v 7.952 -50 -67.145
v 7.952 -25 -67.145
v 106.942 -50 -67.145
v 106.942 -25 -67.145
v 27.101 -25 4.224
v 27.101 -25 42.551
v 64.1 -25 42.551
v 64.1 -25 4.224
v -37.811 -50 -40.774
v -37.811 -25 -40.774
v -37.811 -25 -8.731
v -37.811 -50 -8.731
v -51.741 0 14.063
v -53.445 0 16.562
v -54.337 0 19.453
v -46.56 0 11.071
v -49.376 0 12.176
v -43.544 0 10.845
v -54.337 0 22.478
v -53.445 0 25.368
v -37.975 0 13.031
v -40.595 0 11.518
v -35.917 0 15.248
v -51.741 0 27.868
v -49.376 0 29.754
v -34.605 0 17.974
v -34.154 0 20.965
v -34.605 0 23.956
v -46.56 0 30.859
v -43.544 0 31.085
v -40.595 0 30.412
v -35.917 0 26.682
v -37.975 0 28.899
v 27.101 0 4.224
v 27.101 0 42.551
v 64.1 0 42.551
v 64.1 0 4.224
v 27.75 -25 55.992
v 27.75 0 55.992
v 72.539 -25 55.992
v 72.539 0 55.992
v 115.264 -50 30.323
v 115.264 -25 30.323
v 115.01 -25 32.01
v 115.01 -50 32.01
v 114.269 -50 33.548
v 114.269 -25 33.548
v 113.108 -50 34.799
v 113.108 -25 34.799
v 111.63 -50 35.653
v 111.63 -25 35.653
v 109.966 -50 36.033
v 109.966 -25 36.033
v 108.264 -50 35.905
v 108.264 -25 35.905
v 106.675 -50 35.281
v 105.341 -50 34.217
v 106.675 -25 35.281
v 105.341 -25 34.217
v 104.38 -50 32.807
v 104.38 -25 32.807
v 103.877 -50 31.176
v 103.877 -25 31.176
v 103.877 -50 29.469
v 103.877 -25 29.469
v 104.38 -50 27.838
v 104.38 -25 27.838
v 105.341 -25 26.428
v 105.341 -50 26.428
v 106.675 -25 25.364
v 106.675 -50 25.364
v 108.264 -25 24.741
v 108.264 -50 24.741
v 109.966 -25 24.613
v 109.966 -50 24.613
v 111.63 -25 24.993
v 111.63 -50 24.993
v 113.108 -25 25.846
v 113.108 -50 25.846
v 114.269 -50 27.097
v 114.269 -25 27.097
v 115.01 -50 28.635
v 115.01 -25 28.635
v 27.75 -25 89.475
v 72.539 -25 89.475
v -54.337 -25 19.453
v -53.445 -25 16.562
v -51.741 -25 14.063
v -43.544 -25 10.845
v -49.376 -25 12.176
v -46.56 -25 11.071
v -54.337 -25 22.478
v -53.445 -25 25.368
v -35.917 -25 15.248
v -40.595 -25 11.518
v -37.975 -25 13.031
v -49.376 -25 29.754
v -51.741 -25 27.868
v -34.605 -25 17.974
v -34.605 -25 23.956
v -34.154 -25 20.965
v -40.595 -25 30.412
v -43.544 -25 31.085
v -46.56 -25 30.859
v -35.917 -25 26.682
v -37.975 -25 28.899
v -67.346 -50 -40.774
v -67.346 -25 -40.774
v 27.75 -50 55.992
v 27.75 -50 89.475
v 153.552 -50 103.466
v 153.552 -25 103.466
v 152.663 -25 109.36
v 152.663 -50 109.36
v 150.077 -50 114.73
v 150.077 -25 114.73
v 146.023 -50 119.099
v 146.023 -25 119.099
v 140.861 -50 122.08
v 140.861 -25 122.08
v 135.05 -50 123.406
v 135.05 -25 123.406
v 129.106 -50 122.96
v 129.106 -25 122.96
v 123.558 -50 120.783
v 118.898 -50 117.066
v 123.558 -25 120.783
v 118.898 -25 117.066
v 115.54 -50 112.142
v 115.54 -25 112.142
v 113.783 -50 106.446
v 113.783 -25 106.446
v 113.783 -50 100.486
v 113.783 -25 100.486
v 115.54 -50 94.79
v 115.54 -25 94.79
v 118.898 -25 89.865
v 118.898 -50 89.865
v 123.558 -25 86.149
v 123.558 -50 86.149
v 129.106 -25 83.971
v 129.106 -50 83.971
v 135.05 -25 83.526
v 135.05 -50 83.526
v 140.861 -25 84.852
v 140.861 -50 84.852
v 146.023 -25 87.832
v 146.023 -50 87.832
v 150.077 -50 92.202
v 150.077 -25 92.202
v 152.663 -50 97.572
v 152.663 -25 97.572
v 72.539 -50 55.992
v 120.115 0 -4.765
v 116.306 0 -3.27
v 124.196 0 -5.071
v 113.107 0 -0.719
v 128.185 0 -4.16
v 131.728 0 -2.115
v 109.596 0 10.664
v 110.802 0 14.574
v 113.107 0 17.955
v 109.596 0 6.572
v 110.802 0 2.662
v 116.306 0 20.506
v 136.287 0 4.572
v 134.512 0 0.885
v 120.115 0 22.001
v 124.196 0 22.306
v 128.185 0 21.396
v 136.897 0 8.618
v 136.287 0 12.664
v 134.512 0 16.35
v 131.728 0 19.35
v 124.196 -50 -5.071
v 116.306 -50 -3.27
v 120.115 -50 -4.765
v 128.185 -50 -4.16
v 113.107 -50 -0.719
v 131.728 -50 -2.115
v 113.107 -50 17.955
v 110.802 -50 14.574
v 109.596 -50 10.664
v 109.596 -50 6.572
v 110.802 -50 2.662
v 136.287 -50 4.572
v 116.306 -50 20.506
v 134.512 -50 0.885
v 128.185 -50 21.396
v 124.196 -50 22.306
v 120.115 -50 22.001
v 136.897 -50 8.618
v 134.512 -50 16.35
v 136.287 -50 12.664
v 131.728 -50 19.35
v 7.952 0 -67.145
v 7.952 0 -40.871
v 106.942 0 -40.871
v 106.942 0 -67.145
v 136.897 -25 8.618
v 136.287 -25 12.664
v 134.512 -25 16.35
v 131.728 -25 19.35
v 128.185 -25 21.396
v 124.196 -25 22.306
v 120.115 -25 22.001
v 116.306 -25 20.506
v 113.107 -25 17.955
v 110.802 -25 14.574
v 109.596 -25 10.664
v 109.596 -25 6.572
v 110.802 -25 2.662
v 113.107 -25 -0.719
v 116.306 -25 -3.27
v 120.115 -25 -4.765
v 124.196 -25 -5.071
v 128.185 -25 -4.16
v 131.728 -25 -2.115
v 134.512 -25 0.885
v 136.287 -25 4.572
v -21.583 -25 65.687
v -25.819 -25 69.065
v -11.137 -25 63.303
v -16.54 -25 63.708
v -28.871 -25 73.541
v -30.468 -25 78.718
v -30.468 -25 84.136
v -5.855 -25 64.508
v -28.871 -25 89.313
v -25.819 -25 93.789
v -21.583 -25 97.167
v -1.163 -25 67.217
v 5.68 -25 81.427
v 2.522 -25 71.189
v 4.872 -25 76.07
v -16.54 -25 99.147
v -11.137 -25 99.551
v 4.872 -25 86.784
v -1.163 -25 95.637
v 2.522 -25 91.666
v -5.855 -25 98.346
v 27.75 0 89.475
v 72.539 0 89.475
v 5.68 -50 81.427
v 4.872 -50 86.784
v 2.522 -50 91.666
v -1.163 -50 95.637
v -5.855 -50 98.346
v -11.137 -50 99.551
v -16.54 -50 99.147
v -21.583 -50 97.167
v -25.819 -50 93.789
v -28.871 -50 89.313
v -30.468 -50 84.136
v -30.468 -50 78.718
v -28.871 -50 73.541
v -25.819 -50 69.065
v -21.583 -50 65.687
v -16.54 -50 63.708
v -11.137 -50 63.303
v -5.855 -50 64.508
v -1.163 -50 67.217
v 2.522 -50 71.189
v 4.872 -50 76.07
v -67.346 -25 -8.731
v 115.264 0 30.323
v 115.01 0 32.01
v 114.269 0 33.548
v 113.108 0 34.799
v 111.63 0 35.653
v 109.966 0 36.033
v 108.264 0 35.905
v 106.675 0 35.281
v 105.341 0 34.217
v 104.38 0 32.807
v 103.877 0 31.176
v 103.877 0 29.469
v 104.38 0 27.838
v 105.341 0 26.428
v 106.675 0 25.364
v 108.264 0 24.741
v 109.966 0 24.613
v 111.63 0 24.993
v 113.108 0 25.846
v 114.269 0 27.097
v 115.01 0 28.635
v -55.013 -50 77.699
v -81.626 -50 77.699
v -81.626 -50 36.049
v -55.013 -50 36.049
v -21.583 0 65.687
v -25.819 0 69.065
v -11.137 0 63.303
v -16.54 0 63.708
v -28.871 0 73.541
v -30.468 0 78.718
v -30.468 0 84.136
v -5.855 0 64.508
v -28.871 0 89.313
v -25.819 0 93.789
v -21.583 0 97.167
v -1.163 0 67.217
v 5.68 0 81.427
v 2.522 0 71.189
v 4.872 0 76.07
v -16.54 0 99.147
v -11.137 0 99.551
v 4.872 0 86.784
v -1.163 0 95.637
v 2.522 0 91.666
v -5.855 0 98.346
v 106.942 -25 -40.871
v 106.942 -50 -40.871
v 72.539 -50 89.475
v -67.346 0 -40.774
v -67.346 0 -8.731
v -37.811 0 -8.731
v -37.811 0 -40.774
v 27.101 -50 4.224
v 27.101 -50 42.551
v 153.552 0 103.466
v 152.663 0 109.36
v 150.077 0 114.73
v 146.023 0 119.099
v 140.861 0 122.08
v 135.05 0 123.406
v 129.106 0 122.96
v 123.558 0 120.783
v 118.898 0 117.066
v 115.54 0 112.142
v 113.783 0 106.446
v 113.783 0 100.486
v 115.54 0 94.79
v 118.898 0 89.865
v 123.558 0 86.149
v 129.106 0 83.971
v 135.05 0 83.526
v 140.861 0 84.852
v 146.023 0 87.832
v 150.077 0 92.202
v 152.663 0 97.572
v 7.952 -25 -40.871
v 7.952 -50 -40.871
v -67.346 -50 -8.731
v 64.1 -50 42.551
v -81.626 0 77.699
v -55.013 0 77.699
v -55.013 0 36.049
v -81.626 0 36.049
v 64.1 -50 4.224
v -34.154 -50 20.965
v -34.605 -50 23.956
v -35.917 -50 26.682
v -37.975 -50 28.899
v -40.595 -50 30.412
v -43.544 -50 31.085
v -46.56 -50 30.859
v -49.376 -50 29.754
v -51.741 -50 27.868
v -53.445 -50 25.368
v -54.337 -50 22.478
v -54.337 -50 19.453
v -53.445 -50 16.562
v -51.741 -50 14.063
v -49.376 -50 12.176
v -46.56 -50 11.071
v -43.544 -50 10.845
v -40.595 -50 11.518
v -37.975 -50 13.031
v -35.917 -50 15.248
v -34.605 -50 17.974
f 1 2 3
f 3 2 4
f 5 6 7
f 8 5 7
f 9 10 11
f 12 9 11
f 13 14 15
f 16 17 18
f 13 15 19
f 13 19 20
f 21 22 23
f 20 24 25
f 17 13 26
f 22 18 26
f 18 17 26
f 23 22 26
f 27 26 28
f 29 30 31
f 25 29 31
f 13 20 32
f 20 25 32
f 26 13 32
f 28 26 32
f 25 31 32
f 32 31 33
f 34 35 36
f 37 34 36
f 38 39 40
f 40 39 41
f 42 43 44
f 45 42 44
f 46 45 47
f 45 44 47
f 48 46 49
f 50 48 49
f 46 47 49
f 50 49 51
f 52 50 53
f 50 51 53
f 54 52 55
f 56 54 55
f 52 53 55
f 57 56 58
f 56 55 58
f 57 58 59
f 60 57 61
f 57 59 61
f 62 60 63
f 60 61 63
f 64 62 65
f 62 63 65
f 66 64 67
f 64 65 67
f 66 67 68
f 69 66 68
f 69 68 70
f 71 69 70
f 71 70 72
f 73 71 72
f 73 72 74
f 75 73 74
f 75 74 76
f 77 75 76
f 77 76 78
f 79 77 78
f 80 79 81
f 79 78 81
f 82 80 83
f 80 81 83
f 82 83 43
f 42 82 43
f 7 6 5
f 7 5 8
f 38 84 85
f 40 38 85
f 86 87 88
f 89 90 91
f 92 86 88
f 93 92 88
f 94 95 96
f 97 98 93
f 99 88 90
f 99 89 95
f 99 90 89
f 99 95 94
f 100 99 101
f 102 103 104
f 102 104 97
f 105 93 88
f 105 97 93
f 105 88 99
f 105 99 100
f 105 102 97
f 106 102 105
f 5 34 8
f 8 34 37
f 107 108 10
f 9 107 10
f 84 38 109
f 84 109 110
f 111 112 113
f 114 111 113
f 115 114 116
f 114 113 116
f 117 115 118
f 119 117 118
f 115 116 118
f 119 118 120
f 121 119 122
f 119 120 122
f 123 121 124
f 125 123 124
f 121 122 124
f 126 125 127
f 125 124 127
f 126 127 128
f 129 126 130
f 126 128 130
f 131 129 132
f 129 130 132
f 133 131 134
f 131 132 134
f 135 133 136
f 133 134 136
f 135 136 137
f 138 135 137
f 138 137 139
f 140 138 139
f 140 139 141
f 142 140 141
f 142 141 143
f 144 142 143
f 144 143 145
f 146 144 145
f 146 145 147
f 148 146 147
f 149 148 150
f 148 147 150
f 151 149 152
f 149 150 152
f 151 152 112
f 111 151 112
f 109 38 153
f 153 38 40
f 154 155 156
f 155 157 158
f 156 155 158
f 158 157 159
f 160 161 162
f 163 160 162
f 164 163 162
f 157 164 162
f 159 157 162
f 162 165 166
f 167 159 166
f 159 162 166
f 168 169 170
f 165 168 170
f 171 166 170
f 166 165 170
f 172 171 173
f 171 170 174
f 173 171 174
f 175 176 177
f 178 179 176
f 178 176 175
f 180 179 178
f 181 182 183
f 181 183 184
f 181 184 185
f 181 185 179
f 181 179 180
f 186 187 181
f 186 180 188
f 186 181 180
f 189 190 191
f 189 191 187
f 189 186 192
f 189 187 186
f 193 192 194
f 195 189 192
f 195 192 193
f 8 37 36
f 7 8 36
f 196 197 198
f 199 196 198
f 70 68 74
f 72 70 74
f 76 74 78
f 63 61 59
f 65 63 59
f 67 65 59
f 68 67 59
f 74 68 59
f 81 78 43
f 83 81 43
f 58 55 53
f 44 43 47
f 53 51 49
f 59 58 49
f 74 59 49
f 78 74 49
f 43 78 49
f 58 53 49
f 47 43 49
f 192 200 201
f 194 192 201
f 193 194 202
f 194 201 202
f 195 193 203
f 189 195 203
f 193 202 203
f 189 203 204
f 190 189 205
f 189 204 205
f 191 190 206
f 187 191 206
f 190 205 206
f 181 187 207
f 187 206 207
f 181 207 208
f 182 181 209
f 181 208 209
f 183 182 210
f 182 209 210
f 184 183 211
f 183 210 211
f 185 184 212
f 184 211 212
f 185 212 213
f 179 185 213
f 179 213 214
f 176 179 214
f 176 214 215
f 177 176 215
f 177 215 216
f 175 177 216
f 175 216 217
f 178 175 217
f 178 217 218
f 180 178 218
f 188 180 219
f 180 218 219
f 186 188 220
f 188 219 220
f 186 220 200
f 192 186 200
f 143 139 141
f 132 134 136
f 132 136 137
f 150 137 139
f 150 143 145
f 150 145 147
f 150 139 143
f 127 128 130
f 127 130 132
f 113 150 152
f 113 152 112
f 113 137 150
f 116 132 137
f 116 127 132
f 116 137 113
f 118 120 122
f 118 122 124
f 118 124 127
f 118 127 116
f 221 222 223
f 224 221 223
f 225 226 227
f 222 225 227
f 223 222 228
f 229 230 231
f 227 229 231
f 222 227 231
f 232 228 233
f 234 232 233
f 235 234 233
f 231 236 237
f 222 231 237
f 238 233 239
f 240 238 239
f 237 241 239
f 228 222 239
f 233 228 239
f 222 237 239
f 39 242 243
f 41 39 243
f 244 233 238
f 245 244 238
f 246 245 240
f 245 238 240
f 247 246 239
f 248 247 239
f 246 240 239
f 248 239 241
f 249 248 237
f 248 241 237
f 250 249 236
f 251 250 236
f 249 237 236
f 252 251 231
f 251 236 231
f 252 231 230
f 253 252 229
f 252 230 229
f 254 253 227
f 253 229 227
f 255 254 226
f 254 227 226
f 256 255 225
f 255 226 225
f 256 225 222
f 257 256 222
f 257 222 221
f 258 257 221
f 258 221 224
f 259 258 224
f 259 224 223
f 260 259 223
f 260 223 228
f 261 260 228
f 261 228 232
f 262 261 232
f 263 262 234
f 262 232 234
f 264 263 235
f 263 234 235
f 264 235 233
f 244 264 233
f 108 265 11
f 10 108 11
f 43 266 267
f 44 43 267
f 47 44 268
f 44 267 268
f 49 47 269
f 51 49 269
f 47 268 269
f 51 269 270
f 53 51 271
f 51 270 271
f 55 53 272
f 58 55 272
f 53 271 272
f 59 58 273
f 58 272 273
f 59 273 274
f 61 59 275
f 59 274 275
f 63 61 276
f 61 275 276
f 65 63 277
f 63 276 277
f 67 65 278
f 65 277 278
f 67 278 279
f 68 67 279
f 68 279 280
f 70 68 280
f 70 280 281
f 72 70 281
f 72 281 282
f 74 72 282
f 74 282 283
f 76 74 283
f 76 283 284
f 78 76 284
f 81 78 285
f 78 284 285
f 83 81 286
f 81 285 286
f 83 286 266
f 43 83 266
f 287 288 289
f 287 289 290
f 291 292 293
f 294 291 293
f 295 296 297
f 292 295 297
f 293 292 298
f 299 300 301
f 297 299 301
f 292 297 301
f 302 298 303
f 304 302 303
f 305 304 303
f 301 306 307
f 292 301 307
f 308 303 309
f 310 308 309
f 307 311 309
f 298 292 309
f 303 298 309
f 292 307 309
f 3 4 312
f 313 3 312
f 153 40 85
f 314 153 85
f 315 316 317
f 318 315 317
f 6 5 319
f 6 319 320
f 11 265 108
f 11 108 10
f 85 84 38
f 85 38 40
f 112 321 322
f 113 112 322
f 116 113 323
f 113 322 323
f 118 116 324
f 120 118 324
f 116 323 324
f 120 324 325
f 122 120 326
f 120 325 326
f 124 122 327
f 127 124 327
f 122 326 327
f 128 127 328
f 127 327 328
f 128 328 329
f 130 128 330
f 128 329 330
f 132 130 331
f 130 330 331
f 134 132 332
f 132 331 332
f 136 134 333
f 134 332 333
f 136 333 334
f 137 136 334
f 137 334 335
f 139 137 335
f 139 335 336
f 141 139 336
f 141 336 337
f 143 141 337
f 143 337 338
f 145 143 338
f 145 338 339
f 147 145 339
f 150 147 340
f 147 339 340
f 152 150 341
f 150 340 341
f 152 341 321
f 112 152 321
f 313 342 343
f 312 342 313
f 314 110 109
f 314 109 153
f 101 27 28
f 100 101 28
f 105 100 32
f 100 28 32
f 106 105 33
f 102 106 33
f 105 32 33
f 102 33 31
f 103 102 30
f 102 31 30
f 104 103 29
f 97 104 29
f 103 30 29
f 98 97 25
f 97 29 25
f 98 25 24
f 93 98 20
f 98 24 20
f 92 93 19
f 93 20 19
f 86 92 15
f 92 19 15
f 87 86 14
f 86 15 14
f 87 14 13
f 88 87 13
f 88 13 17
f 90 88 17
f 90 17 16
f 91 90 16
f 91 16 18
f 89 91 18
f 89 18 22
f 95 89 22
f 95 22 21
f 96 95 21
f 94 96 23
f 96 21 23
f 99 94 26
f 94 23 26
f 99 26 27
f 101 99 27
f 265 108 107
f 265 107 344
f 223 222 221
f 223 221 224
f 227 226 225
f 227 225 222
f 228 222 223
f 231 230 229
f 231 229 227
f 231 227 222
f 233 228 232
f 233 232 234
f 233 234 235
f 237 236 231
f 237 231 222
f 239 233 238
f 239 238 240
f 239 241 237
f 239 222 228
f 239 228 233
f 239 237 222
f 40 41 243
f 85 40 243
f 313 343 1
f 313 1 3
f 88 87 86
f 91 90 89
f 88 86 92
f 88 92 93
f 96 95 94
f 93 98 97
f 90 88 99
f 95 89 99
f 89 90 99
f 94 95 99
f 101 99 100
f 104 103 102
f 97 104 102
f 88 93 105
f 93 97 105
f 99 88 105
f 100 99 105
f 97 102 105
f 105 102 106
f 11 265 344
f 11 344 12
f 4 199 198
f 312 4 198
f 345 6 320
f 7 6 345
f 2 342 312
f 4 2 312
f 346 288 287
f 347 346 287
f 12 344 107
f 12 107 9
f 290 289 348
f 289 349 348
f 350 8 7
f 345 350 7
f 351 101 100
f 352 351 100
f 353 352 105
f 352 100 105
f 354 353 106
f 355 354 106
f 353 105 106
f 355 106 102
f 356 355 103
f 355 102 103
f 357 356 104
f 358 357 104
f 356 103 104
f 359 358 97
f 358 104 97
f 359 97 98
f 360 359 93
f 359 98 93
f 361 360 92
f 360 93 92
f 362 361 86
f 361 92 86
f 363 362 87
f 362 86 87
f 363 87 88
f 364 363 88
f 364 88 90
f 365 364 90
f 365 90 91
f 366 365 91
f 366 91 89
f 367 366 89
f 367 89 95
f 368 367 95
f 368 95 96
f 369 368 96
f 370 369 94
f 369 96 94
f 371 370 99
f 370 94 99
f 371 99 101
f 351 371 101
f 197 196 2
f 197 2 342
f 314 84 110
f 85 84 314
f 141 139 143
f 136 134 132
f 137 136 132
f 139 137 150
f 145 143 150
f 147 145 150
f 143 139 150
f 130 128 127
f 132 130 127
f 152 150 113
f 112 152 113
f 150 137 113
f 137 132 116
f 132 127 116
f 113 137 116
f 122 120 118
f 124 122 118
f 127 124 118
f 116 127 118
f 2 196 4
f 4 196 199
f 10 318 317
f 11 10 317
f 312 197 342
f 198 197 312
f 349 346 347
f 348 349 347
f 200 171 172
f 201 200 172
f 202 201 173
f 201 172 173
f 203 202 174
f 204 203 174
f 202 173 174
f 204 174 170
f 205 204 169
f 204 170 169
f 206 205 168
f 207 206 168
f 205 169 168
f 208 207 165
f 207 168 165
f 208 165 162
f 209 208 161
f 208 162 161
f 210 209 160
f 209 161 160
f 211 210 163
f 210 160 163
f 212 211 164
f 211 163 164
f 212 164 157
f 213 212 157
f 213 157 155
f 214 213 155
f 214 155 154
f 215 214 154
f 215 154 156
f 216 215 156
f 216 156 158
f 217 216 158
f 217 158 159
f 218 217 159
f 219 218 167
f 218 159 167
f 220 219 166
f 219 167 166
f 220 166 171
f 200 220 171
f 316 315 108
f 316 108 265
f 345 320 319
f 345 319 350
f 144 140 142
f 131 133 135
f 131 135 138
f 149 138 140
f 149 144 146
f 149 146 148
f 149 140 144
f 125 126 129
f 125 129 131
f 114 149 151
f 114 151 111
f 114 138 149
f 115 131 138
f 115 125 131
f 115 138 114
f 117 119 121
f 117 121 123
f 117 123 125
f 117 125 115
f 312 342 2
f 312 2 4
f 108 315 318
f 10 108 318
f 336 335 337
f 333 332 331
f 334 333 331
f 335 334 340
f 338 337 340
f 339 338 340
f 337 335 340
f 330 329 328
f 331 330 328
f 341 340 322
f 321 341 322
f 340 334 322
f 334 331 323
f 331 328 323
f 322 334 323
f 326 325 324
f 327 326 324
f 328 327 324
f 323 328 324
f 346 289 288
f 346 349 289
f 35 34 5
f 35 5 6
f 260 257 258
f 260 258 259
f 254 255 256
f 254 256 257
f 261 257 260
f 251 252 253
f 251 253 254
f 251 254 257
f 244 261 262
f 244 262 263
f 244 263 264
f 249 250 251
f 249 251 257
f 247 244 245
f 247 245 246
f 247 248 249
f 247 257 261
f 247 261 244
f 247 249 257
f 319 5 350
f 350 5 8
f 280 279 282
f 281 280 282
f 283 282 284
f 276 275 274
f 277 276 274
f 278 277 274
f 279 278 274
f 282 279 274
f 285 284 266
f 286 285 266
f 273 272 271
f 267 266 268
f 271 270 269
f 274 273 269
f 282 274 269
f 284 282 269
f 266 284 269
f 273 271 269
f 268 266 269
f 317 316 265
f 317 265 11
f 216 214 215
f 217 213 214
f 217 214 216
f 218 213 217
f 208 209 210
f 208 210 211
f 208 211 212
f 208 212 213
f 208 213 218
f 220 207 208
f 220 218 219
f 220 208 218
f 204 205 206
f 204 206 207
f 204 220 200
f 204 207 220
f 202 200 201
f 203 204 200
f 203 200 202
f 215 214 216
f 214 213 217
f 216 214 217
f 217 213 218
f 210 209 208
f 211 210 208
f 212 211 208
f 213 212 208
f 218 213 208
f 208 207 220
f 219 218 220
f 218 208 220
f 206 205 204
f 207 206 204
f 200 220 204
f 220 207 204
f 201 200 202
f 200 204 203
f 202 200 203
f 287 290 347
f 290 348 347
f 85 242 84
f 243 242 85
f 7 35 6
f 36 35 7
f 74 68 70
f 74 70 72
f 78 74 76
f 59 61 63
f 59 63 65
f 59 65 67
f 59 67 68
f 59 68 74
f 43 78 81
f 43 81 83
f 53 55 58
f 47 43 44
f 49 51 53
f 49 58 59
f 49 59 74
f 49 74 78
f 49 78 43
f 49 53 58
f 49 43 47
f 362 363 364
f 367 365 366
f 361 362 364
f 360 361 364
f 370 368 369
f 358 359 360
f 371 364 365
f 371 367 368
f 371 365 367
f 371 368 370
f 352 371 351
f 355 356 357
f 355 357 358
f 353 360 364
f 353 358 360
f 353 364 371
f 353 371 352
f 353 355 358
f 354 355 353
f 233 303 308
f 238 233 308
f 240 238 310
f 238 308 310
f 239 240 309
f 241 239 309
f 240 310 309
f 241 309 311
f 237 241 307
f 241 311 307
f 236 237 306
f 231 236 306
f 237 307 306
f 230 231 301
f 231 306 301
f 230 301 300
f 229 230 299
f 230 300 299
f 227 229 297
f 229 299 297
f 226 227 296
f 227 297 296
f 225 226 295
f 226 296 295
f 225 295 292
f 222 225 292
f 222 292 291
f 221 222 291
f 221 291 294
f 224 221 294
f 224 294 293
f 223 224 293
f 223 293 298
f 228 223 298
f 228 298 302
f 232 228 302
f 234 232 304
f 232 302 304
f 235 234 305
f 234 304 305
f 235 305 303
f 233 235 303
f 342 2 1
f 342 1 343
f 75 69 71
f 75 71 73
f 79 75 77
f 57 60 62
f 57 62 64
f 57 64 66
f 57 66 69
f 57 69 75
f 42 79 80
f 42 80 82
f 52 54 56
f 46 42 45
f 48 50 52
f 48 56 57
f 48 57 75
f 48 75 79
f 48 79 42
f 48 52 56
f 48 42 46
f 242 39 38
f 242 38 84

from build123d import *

# Parameters (mm, degrees)
F0_W     = 26.613753289
F0_H     = 41.6500791907
F1_DEPTH = 25
F0_W_2   = 44.7890106589
F0_H_2   = 33.482324332
F0_W_3   = 36.9996093214
F0_H_3   = 38.3273893967
F0_W_4   = 29.534779489
F0_H_4   = 32.0437960327
F0_W_5   = 98.9901963621
F0_H_5   = 26.2742973864
F0_R     = 18.1752443314
F0_R_2   = 10.148267962
F0_R_3   = 5.7257656008
F0_R_4   = 13.7270743948
F0_R_5   = 19.9959609748
F2_DEPTH = 25


with BuildPart() as f1:
    # F0 (on Front) → F1 (new body)
    with BuildSketch(Plane.XZ):
        with Locations((-68.3194566518, 56.8735636771)):
            Rectangle(F0_W, F0_H)
    extrude(amount=F1_DEPTH)

    # F2 (add): a face of the model
    f2_faces = [f1.faces().sort_by_distance(p)[0] for p in [
        (-68.3194566518, -25, 56.8735636771),
    ]]
    extrude(f2_faces, amount=F2_DEPTH)


with BuildPart() as f1b:
    # F0 (on Front) → F1, piece 2 (new body)
    with BuildSketch(Plane.XZ):
        with Locations((50.1442132518, 72.7335456759)):
            Rectangle(F0_W_2, F0_H_2)
    extrude(amount=F1_DEPTH)


with BuildPart() as f1c:
    # F0 (on Front) → F1, piece 3 (new body)
    with BuildSketch(Plane.XZ):
        with Locations((45.600393787, 23.3872788958)):
            Rectangle(F0_W_3, F0_H_3)
    extrude(amount=F1_DEPTH)


with BuildPart() as f1d:
    # F0 (on Front) → F1, piece 4 (new body)
    with BuildSketch(Plane.XZ):
        with Locations((-52.5783933699, -24.7525367886)):
            Rectangle(F0_W_4, F0_H_4)
    extrude(amount=F1_DEPTH)


with BuildPart() as f1e:
    # F0 (on Front) → F1, piece 5 (new body)
    with BuildSketch(Plane.XZ):
        with Locations((57.4467657134, -54.0079157799)):
            Rectangle(F0_W_5, F0_H_5)
    extrude(amount=F1_DEPTH)


with BuildPart() as f1f:
    # F0 (on Front) → F1, piece 6 (new body)
    with BuildSketch(Plane.XZ):
        with Locations((-12.4954786152, 81.4270600677)):
            Circle(F0_R)
    extrude(amount=F1_DEPTH)


with BuildPart() as f1g:
    # F0 (on Front) → F1, piece 7 (new body)
    with BuildSketch(Plane.XZ):
        with Locations((-44.3021655083, 20.9651011974)):
            Circle(F0_R_2)
    extrude(amount=F1_DEPTH)


with BuildPart() as f1h:
    # F0 (on Front) → F1, piece 8 (new body)
    with BuildSketch(Plane.XZ):
        with Locations((109.5383316278, 30.3227584809)):
            Circle(F0_R_3)
    extrude(amount=F1_DEPTH)


with BuildPart() as f1i:
    # F0 (on Front) → F1, piece 9 (new body)
    with BuildSketch(Plane.XZ):
        with Locations((123.1697648764, 8.6177336052)):
            Circle(F0_R_4)
    extrude(amount=F1_DEPTH)


with BuildPart() as f1j:
    # F0 (on Front) → F1, piece 10 (new body)
    with BuildSketch(Plane.XZ):
        with Locations((133.5556060076, 103.4657880664)):
            Circle(F0_R_5)
    extrude(amount=F1_DEPTH)


with BuildPart() as f2:
    # F2#2 (new): a face of the model
    f2_2_faces = [f1b.part.faces().sort_by_distance(p)[0] for p in [
        (50.1442132518, -25, 72.7335456759),
    ]]
    extrude(f2_2_faces, amount=F2_DEPTH)


with BuildPart() as f2b:
    # F2#3 (new): a face of the model
    f2_3_faces = [f1f.part.faces().sort_by_distance(p)[0] for p in [
        (-12.4954786152, -25, 81.4270600677),
    ]]
    extrude(f2_3_faces, amount=F2_DEPTH)


with BuildPart() as f2c:
    # F2#4 (new): a face of the model
    f2_4_faces = [f1g.part.faces().sort_by_distance(p)[0] for p in [
        (-44.3021655083, -25, 20.9651011974),
    ]]
    extrude(f2_4_faces, amount=F2_DEPTH)


with BuildPart() as f2d:
    # F2#5 (new): a face of the model
    f2_5_faces = [f1d.part.faces().sort_by_distance(p)[0] for p in [
        (-52.5783933699, -25, -24.7525367886),
    ]]
    extrude(f2_5_faces, amount=F2_DEPTH)


with BuildPart() as f2e:
    # F2#6 (new): a face of the model
    f2_6_faces = [f1e.part.faces().sort_by_distance(p)[0] for p in [
        (57.4467657134, -25, -54.0079157799),
    ]]
    extrude(f2_6_faces, amount=F2_DEPTH)


with BuildPart() as f2f:
    # F2#7 (new): a face of the model
    f2_7_faces = [f1i.part.faces().sort_by_distance(p)[0] for p in [
        (123.1697648764, -25, 8.6177336052),
    ]]
    extrude(f2_7_faces, amount=F2_DEPTH)


with BuildPart() as f2g:
    # F2#8 (new): a face of the model
    f2_8_faces = [f1c.part.faces().sort_by_distance(p)[0] for p in [
        (45.600393787, -25, 23.3872788958),
    ]]
    extrude(f2_8_faces, amount=F2_DEPTH)


with BuildPart() as f2h:
    # F2#9 (new): a face of the model
    f2_9_faces = [f1h.part.faces().sort_by_distance(p)[0] for p in [
        (109.5383316278, -25, 30.3227584809),
    ]]
    extrude(f2_9_faces, amount=F2_DEPTH)


with BuildPart() as f2i:
    # F2#10 (new): a face of the model
    f2_10_faces = [f1j.part.faces().sort_by_distance(p)[0] for p in [
        (133.5556060076, -25, 103.4657880664),
    ]]
    extrude(f2_10_faces, amount=F2_DEPTH)


solid = Compound([f1.part, f1b.part, f1c.part, f1d.part, f1e.part, f1f.part, f1g.part, f1h.part, f1i.part, f1j.part, f2.part, f2b.part, f2c.part, f2d.part, f2e.part, f2f.part, f2g.part, f2h.part, f2i.part])
